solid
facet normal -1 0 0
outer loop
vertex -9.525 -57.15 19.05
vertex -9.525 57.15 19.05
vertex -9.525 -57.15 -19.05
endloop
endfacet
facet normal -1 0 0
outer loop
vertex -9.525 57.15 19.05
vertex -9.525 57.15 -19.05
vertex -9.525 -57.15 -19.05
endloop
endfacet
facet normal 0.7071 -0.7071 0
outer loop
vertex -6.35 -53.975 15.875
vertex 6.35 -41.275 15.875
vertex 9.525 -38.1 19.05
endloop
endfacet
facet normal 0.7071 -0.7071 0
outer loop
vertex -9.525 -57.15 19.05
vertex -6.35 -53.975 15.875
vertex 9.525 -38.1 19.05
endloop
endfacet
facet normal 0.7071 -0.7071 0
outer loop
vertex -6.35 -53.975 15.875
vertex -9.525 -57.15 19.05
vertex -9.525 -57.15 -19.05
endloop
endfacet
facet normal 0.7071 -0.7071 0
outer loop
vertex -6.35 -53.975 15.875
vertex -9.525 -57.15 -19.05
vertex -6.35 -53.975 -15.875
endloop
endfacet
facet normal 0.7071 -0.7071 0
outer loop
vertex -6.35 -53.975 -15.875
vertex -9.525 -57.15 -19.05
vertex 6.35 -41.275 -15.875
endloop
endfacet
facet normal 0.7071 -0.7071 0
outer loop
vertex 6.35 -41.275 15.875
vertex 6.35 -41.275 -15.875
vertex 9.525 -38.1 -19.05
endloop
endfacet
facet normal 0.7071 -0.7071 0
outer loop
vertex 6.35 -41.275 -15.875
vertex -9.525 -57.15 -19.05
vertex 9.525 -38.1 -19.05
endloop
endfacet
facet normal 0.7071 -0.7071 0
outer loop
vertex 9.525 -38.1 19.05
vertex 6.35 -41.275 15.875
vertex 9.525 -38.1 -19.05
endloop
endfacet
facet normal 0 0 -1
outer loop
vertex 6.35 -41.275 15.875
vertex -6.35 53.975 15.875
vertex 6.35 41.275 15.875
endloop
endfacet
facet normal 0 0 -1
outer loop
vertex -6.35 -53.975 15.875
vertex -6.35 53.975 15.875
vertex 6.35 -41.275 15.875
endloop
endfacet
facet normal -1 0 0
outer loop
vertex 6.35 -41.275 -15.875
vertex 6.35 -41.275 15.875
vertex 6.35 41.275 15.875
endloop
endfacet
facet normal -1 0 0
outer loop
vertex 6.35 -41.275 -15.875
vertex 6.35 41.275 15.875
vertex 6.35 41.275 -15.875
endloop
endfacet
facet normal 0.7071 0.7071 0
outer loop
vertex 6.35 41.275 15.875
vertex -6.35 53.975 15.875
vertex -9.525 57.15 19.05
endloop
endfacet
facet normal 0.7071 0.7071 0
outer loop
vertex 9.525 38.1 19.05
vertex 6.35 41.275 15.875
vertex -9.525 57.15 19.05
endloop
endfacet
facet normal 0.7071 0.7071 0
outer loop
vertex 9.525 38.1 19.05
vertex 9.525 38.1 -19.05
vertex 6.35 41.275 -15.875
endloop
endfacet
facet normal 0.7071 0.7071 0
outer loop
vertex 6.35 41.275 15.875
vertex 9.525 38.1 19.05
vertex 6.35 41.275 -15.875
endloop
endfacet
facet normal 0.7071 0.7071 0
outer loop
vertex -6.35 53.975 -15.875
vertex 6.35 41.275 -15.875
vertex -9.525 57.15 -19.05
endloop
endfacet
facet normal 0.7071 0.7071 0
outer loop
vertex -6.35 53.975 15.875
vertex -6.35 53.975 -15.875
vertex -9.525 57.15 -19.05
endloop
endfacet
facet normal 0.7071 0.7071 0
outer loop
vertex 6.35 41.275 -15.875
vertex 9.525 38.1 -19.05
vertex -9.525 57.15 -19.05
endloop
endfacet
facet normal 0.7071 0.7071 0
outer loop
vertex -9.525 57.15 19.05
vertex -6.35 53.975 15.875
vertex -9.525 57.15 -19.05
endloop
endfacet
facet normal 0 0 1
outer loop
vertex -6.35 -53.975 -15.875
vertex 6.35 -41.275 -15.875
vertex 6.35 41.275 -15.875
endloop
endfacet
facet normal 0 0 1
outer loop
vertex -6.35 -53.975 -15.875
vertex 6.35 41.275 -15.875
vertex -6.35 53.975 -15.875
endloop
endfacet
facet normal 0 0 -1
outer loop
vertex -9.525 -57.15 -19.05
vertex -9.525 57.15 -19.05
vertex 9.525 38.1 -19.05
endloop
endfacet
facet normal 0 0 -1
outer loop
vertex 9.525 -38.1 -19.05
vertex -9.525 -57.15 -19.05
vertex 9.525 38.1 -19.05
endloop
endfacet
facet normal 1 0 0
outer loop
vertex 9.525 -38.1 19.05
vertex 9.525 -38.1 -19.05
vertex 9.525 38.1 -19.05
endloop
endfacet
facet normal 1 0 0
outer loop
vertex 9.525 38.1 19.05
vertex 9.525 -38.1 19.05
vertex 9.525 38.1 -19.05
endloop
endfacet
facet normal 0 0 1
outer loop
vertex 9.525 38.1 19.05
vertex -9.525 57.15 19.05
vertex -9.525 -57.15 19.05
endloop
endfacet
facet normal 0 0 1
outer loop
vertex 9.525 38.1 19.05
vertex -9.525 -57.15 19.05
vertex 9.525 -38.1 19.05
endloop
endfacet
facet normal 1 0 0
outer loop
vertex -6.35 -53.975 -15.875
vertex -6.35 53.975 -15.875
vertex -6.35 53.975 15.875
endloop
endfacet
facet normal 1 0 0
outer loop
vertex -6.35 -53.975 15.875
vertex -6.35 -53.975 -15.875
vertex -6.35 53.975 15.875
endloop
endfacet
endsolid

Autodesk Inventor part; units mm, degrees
ref_plane "YZ Plane" through (0, 0, 0) normal (1, 0, 0) x (0, 1, 0)
ref_plane "XZ Plane" through (0, 0, 0) normal (0, 1, 0) x (-1, 0, 0)
ref_plane "XY Plane" through (0, 0, 0) normal (0, 0, 1) x (1, 0, 0)
sketch "Sketch1" plane through (0, 0, 0) normal (0, 0, 1) x (1, 0, 0)
  line L0 (-9.525, -38.1) -> (9.525, -38.1)
  line L1 (9.525, -38.1) -> (9.525, 38.1)
  line L2 (9.525, 38.1) -> (-9.525, 38.1)
  line L3 (-9.525, 38.1) -> (-9.525, -38.1)
  line L4 (-9.525, -38.1) -> (9.525, 38.1) construction
  line L5 (9.525, -38.1) -> (-9.525, 38.1) construction
  line L6 (9.525, 38.1) -> (-9.525, 57.15)
  line L7 (-9.525, 57.15) -> (-9.525, 38.1)
  line L8 (-9.525, -38.1) -> (-9.525, -57.15)
  line L9 (-9.525, -57.15) -> (9.525, -38.1)
  point P0 (0, 0)
  dimension "d0" = 19.05
  dimension "d1" = 45
  dimension "d2" = 45
  dimension "d10" = 114.3
extrude "Extrusion1" add sketch "Sketch1" along normal mid plane 38.1
sketch "Sketch2" plane through (0, 0, 0) normal (0, 1, 0) x (-1, 0, 0)
  line L0 (6.35, 15.875) -> (-6.35, 15.875)
  line L1 (-6.35, 15.875) -> (-6.35, -15.875)
  line L2 (-6.35, -15.875) -> (6.35, -15.875)
  line L3 (6.35, -15.875) -> (6.35, 15.875)
  line L4 (6.35, 15.875) -> (-6.35, -15.875) construction
  line L5 (-6.35, 15.875) -> (6.35, -15.875) construction
  line L6 (-9.525, -19.05) -> (-9.525, 19.05) projected
  line L7 (-9.525, -19.05) -> (9.525, -19.05) projected
  point P0 (0, 0)
  dimension "d6" = 3.175
  dimension "d7" = 3.175
extrude "Extrusion2" cut sketch "Sketch2" along normal through all both and the other way through all
equation "\"d0\" = width"
equation "\"d10\" = length"
equation "\"d3\" = longSide"
equation "\"d8\" = longSide"
equation "\"width\" = 19.05"
equation "\"longSide\" = 38.1"
equation "\"length\" = 114.3"
properties part number "45dege0_75x1.50ForBottomOfShooter" material "Aluminum 6061"
